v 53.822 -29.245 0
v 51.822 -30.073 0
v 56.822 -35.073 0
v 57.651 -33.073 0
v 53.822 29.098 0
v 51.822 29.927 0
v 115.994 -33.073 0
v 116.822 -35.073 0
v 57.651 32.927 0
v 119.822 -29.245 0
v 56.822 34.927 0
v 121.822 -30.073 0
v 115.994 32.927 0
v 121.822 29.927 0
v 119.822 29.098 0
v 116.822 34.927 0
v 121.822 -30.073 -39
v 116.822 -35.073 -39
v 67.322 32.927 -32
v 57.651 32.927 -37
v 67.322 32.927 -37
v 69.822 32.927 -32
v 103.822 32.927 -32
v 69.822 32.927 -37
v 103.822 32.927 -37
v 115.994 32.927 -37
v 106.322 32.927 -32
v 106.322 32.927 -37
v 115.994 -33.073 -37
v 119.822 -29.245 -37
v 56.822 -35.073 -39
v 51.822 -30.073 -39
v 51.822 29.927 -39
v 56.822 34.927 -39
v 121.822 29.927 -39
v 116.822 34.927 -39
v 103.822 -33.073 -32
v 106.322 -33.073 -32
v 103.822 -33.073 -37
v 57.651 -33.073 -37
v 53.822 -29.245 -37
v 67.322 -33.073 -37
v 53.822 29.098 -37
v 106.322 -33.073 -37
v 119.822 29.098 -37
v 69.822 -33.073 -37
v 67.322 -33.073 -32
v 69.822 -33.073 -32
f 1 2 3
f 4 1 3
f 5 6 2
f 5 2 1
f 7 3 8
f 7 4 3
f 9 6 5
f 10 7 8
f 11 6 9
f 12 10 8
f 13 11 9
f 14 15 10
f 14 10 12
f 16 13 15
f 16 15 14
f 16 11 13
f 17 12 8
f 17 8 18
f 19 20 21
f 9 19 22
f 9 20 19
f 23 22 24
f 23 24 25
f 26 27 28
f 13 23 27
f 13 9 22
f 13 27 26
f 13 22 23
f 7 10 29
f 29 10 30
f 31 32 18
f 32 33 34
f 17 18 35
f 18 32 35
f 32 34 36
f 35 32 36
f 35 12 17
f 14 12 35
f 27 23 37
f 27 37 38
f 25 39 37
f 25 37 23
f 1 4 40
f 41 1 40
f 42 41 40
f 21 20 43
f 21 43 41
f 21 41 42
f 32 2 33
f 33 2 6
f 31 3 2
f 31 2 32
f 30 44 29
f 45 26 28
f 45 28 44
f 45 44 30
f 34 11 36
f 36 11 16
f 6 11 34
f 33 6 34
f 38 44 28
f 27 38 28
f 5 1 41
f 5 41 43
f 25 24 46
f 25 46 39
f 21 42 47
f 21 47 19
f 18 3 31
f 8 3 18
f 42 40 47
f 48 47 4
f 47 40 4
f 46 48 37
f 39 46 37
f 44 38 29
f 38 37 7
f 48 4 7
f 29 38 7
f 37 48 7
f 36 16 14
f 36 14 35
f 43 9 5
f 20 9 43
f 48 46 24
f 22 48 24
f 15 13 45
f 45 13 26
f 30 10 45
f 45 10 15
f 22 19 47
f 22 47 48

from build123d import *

# Parameters (mm, degrees)
SKETCH1_W           = 70
SKETCH1_H           = 70
BOSS_EXTRUDE1_DEPTH = 39
CHAMFER1_SIZE       = 5
SHELL1_T            = -2
SKETCH3_W           = 2.5
SKETCH3_H           = 66
BOSS_EXTRUDE2_DEPTH = 5


with BuildPart() as part:
    # Sketch1 → Boss-Extrude1 (new body)
    with BuildSketch(Plane.XY):
        with Locations((86.822194683, -0.073375262)):
            Rectangle(SKETCH1_W, SKETCH1_H)
    extrude(amount=-BOSS_EXTRUDE1_DEPTH)

    # Chamfer1
    chamfer1_edges = [part.edges().sort_by_distance(p)[0] for p in [
        (51.822194683, 34.926624738, -19.5),
        (121.822194683, 34.926624738, -19.5),
        (121.822194683, -35.073375262, -19.5),
        (51.822194683, -35.073375262, -19.5),
    ]]
    chamfer(chamfer1_edges, length=CHAMFER1_SIZE)

    # Shell1
    shell1_openings = [part.faces().sort_by_distance(p)[0] for p in [
        (86.822194683, -0.073375262, 0),
    ]]
    offset(amount=SHELL1_T, openings=shell1_openings, kind=Kind.INTERSECTION)

    # Sketch3 → Boss-Extrude2 (add)
    with BuildSketch(Plane.XY.offset(-37)):
        with Locations((68.572194683, -0.073375262)):
            Rectangle(SKETCH3_W, SKETCH3_H)
        with Locations((105.072194683, -0.073375262)):
            Rectangle(SKETCH3_W, SKETCH3_H)
    extrude(amount=BOSS_EXTRUDE2_DEPTH)


solid = part.part
